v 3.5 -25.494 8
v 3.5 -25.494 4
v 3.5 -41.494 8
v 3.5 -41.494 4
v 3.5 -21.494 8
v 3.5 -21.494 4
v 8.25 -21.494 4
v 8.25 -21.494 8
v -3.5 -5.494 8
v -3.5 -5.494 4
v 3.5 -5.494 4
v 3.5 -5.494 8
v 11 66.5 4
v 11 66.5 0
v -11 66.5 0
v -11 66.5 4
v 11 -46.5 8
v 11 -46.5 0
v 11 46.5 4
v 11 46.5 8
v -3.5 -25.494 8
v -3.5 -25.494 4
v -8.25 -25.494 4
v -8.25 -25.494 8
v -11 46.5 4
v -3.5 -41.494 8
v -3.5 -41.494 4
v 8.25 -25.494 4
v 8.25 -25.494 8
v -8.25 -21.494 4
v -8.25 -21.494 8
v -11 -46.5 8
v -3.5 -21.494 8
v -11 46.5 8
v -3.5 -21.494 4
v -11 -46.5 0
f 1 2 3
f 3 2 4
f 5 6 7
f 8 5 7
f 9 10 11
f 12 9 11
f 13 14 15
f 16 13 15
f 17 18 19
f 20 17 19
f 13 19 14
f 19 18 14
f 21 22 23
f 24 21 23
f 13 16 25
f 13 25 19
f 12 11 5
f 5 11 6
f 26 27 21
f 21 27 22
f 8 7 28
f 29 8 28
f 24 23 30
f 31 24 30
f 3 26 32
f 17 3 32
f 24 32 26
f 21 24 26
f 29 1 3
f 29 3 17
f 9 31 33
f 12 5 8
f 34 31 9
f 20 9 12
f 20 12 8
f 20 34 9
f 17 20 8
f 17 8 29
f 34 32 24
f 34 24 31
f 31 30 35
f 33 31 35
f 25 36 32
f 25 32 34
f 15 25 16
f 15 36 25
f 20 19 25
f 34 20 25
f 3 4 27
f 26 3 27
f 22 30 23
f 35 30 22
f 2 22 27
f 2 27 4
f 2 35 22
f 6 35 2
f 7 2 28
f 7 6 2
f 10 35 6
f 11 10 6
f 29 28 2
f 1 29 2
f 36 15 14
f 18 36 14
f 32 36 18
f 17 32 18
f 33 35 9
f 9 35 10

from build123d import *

# Parameters (mm, degrees)
F1_DEPTH = 8
F0_W     = 11
F0_H     = 20
F0_W_2   = 7
F0_H_2   = 16
F2_DEPTH = 4


with BuildPart() as f1:
    # F0 (on Top) → F1 (new body)
    with BuildSketch(Plane.XY):
        Polygon((11, -46.5), (11, 46.5), (0, 46.5), (-11, 46.5), (-11, -46.5), align=None)
        Polygon((8.25, -21.494463), (8.25, -25.494463), (3.5, -25.494463), (3.5, -41.494463), (-3.5, -41.494463), (-3.5, -25.494463), (-8.25, -25.494463), (-8.25, -21.494463), (-3.5, -21.494463), (-3.5, -5.494463), (3.5, -5.494463), (3.5, -21.494463), align=None, mode=Mode.SUBTRACT)
    extrude(amount=F1_DEPTH)

    # F0 (on Top) → F2 (join)
    with BuildSketch(Plane.XY):
        with Locations((5.5, 56.5)):
            Rectangle(F0_W, F0_H)
        with Locations((0, -13.494463)):
            Rectangle(F0_W_2, F0_H_2)
        Polygon((3.5, -25.494463), (8.25, -25.494463), (8.25, -21.494463), (3.5, -21.494463), (-3.5, -21.494463), (-8.25, -21.494463), (-8.25, -25.494463), (-3.5, -25.494463), align=None)
        with Locations((0, -33.494463)):
            Rectangle(F0_W_2, F0_H_2)
        with Locations((-5.5, 56.5)):
            Rectangle(F0_W, F0_H)
    extrude(amount=F2_DEPTH)


solid = f1.part
